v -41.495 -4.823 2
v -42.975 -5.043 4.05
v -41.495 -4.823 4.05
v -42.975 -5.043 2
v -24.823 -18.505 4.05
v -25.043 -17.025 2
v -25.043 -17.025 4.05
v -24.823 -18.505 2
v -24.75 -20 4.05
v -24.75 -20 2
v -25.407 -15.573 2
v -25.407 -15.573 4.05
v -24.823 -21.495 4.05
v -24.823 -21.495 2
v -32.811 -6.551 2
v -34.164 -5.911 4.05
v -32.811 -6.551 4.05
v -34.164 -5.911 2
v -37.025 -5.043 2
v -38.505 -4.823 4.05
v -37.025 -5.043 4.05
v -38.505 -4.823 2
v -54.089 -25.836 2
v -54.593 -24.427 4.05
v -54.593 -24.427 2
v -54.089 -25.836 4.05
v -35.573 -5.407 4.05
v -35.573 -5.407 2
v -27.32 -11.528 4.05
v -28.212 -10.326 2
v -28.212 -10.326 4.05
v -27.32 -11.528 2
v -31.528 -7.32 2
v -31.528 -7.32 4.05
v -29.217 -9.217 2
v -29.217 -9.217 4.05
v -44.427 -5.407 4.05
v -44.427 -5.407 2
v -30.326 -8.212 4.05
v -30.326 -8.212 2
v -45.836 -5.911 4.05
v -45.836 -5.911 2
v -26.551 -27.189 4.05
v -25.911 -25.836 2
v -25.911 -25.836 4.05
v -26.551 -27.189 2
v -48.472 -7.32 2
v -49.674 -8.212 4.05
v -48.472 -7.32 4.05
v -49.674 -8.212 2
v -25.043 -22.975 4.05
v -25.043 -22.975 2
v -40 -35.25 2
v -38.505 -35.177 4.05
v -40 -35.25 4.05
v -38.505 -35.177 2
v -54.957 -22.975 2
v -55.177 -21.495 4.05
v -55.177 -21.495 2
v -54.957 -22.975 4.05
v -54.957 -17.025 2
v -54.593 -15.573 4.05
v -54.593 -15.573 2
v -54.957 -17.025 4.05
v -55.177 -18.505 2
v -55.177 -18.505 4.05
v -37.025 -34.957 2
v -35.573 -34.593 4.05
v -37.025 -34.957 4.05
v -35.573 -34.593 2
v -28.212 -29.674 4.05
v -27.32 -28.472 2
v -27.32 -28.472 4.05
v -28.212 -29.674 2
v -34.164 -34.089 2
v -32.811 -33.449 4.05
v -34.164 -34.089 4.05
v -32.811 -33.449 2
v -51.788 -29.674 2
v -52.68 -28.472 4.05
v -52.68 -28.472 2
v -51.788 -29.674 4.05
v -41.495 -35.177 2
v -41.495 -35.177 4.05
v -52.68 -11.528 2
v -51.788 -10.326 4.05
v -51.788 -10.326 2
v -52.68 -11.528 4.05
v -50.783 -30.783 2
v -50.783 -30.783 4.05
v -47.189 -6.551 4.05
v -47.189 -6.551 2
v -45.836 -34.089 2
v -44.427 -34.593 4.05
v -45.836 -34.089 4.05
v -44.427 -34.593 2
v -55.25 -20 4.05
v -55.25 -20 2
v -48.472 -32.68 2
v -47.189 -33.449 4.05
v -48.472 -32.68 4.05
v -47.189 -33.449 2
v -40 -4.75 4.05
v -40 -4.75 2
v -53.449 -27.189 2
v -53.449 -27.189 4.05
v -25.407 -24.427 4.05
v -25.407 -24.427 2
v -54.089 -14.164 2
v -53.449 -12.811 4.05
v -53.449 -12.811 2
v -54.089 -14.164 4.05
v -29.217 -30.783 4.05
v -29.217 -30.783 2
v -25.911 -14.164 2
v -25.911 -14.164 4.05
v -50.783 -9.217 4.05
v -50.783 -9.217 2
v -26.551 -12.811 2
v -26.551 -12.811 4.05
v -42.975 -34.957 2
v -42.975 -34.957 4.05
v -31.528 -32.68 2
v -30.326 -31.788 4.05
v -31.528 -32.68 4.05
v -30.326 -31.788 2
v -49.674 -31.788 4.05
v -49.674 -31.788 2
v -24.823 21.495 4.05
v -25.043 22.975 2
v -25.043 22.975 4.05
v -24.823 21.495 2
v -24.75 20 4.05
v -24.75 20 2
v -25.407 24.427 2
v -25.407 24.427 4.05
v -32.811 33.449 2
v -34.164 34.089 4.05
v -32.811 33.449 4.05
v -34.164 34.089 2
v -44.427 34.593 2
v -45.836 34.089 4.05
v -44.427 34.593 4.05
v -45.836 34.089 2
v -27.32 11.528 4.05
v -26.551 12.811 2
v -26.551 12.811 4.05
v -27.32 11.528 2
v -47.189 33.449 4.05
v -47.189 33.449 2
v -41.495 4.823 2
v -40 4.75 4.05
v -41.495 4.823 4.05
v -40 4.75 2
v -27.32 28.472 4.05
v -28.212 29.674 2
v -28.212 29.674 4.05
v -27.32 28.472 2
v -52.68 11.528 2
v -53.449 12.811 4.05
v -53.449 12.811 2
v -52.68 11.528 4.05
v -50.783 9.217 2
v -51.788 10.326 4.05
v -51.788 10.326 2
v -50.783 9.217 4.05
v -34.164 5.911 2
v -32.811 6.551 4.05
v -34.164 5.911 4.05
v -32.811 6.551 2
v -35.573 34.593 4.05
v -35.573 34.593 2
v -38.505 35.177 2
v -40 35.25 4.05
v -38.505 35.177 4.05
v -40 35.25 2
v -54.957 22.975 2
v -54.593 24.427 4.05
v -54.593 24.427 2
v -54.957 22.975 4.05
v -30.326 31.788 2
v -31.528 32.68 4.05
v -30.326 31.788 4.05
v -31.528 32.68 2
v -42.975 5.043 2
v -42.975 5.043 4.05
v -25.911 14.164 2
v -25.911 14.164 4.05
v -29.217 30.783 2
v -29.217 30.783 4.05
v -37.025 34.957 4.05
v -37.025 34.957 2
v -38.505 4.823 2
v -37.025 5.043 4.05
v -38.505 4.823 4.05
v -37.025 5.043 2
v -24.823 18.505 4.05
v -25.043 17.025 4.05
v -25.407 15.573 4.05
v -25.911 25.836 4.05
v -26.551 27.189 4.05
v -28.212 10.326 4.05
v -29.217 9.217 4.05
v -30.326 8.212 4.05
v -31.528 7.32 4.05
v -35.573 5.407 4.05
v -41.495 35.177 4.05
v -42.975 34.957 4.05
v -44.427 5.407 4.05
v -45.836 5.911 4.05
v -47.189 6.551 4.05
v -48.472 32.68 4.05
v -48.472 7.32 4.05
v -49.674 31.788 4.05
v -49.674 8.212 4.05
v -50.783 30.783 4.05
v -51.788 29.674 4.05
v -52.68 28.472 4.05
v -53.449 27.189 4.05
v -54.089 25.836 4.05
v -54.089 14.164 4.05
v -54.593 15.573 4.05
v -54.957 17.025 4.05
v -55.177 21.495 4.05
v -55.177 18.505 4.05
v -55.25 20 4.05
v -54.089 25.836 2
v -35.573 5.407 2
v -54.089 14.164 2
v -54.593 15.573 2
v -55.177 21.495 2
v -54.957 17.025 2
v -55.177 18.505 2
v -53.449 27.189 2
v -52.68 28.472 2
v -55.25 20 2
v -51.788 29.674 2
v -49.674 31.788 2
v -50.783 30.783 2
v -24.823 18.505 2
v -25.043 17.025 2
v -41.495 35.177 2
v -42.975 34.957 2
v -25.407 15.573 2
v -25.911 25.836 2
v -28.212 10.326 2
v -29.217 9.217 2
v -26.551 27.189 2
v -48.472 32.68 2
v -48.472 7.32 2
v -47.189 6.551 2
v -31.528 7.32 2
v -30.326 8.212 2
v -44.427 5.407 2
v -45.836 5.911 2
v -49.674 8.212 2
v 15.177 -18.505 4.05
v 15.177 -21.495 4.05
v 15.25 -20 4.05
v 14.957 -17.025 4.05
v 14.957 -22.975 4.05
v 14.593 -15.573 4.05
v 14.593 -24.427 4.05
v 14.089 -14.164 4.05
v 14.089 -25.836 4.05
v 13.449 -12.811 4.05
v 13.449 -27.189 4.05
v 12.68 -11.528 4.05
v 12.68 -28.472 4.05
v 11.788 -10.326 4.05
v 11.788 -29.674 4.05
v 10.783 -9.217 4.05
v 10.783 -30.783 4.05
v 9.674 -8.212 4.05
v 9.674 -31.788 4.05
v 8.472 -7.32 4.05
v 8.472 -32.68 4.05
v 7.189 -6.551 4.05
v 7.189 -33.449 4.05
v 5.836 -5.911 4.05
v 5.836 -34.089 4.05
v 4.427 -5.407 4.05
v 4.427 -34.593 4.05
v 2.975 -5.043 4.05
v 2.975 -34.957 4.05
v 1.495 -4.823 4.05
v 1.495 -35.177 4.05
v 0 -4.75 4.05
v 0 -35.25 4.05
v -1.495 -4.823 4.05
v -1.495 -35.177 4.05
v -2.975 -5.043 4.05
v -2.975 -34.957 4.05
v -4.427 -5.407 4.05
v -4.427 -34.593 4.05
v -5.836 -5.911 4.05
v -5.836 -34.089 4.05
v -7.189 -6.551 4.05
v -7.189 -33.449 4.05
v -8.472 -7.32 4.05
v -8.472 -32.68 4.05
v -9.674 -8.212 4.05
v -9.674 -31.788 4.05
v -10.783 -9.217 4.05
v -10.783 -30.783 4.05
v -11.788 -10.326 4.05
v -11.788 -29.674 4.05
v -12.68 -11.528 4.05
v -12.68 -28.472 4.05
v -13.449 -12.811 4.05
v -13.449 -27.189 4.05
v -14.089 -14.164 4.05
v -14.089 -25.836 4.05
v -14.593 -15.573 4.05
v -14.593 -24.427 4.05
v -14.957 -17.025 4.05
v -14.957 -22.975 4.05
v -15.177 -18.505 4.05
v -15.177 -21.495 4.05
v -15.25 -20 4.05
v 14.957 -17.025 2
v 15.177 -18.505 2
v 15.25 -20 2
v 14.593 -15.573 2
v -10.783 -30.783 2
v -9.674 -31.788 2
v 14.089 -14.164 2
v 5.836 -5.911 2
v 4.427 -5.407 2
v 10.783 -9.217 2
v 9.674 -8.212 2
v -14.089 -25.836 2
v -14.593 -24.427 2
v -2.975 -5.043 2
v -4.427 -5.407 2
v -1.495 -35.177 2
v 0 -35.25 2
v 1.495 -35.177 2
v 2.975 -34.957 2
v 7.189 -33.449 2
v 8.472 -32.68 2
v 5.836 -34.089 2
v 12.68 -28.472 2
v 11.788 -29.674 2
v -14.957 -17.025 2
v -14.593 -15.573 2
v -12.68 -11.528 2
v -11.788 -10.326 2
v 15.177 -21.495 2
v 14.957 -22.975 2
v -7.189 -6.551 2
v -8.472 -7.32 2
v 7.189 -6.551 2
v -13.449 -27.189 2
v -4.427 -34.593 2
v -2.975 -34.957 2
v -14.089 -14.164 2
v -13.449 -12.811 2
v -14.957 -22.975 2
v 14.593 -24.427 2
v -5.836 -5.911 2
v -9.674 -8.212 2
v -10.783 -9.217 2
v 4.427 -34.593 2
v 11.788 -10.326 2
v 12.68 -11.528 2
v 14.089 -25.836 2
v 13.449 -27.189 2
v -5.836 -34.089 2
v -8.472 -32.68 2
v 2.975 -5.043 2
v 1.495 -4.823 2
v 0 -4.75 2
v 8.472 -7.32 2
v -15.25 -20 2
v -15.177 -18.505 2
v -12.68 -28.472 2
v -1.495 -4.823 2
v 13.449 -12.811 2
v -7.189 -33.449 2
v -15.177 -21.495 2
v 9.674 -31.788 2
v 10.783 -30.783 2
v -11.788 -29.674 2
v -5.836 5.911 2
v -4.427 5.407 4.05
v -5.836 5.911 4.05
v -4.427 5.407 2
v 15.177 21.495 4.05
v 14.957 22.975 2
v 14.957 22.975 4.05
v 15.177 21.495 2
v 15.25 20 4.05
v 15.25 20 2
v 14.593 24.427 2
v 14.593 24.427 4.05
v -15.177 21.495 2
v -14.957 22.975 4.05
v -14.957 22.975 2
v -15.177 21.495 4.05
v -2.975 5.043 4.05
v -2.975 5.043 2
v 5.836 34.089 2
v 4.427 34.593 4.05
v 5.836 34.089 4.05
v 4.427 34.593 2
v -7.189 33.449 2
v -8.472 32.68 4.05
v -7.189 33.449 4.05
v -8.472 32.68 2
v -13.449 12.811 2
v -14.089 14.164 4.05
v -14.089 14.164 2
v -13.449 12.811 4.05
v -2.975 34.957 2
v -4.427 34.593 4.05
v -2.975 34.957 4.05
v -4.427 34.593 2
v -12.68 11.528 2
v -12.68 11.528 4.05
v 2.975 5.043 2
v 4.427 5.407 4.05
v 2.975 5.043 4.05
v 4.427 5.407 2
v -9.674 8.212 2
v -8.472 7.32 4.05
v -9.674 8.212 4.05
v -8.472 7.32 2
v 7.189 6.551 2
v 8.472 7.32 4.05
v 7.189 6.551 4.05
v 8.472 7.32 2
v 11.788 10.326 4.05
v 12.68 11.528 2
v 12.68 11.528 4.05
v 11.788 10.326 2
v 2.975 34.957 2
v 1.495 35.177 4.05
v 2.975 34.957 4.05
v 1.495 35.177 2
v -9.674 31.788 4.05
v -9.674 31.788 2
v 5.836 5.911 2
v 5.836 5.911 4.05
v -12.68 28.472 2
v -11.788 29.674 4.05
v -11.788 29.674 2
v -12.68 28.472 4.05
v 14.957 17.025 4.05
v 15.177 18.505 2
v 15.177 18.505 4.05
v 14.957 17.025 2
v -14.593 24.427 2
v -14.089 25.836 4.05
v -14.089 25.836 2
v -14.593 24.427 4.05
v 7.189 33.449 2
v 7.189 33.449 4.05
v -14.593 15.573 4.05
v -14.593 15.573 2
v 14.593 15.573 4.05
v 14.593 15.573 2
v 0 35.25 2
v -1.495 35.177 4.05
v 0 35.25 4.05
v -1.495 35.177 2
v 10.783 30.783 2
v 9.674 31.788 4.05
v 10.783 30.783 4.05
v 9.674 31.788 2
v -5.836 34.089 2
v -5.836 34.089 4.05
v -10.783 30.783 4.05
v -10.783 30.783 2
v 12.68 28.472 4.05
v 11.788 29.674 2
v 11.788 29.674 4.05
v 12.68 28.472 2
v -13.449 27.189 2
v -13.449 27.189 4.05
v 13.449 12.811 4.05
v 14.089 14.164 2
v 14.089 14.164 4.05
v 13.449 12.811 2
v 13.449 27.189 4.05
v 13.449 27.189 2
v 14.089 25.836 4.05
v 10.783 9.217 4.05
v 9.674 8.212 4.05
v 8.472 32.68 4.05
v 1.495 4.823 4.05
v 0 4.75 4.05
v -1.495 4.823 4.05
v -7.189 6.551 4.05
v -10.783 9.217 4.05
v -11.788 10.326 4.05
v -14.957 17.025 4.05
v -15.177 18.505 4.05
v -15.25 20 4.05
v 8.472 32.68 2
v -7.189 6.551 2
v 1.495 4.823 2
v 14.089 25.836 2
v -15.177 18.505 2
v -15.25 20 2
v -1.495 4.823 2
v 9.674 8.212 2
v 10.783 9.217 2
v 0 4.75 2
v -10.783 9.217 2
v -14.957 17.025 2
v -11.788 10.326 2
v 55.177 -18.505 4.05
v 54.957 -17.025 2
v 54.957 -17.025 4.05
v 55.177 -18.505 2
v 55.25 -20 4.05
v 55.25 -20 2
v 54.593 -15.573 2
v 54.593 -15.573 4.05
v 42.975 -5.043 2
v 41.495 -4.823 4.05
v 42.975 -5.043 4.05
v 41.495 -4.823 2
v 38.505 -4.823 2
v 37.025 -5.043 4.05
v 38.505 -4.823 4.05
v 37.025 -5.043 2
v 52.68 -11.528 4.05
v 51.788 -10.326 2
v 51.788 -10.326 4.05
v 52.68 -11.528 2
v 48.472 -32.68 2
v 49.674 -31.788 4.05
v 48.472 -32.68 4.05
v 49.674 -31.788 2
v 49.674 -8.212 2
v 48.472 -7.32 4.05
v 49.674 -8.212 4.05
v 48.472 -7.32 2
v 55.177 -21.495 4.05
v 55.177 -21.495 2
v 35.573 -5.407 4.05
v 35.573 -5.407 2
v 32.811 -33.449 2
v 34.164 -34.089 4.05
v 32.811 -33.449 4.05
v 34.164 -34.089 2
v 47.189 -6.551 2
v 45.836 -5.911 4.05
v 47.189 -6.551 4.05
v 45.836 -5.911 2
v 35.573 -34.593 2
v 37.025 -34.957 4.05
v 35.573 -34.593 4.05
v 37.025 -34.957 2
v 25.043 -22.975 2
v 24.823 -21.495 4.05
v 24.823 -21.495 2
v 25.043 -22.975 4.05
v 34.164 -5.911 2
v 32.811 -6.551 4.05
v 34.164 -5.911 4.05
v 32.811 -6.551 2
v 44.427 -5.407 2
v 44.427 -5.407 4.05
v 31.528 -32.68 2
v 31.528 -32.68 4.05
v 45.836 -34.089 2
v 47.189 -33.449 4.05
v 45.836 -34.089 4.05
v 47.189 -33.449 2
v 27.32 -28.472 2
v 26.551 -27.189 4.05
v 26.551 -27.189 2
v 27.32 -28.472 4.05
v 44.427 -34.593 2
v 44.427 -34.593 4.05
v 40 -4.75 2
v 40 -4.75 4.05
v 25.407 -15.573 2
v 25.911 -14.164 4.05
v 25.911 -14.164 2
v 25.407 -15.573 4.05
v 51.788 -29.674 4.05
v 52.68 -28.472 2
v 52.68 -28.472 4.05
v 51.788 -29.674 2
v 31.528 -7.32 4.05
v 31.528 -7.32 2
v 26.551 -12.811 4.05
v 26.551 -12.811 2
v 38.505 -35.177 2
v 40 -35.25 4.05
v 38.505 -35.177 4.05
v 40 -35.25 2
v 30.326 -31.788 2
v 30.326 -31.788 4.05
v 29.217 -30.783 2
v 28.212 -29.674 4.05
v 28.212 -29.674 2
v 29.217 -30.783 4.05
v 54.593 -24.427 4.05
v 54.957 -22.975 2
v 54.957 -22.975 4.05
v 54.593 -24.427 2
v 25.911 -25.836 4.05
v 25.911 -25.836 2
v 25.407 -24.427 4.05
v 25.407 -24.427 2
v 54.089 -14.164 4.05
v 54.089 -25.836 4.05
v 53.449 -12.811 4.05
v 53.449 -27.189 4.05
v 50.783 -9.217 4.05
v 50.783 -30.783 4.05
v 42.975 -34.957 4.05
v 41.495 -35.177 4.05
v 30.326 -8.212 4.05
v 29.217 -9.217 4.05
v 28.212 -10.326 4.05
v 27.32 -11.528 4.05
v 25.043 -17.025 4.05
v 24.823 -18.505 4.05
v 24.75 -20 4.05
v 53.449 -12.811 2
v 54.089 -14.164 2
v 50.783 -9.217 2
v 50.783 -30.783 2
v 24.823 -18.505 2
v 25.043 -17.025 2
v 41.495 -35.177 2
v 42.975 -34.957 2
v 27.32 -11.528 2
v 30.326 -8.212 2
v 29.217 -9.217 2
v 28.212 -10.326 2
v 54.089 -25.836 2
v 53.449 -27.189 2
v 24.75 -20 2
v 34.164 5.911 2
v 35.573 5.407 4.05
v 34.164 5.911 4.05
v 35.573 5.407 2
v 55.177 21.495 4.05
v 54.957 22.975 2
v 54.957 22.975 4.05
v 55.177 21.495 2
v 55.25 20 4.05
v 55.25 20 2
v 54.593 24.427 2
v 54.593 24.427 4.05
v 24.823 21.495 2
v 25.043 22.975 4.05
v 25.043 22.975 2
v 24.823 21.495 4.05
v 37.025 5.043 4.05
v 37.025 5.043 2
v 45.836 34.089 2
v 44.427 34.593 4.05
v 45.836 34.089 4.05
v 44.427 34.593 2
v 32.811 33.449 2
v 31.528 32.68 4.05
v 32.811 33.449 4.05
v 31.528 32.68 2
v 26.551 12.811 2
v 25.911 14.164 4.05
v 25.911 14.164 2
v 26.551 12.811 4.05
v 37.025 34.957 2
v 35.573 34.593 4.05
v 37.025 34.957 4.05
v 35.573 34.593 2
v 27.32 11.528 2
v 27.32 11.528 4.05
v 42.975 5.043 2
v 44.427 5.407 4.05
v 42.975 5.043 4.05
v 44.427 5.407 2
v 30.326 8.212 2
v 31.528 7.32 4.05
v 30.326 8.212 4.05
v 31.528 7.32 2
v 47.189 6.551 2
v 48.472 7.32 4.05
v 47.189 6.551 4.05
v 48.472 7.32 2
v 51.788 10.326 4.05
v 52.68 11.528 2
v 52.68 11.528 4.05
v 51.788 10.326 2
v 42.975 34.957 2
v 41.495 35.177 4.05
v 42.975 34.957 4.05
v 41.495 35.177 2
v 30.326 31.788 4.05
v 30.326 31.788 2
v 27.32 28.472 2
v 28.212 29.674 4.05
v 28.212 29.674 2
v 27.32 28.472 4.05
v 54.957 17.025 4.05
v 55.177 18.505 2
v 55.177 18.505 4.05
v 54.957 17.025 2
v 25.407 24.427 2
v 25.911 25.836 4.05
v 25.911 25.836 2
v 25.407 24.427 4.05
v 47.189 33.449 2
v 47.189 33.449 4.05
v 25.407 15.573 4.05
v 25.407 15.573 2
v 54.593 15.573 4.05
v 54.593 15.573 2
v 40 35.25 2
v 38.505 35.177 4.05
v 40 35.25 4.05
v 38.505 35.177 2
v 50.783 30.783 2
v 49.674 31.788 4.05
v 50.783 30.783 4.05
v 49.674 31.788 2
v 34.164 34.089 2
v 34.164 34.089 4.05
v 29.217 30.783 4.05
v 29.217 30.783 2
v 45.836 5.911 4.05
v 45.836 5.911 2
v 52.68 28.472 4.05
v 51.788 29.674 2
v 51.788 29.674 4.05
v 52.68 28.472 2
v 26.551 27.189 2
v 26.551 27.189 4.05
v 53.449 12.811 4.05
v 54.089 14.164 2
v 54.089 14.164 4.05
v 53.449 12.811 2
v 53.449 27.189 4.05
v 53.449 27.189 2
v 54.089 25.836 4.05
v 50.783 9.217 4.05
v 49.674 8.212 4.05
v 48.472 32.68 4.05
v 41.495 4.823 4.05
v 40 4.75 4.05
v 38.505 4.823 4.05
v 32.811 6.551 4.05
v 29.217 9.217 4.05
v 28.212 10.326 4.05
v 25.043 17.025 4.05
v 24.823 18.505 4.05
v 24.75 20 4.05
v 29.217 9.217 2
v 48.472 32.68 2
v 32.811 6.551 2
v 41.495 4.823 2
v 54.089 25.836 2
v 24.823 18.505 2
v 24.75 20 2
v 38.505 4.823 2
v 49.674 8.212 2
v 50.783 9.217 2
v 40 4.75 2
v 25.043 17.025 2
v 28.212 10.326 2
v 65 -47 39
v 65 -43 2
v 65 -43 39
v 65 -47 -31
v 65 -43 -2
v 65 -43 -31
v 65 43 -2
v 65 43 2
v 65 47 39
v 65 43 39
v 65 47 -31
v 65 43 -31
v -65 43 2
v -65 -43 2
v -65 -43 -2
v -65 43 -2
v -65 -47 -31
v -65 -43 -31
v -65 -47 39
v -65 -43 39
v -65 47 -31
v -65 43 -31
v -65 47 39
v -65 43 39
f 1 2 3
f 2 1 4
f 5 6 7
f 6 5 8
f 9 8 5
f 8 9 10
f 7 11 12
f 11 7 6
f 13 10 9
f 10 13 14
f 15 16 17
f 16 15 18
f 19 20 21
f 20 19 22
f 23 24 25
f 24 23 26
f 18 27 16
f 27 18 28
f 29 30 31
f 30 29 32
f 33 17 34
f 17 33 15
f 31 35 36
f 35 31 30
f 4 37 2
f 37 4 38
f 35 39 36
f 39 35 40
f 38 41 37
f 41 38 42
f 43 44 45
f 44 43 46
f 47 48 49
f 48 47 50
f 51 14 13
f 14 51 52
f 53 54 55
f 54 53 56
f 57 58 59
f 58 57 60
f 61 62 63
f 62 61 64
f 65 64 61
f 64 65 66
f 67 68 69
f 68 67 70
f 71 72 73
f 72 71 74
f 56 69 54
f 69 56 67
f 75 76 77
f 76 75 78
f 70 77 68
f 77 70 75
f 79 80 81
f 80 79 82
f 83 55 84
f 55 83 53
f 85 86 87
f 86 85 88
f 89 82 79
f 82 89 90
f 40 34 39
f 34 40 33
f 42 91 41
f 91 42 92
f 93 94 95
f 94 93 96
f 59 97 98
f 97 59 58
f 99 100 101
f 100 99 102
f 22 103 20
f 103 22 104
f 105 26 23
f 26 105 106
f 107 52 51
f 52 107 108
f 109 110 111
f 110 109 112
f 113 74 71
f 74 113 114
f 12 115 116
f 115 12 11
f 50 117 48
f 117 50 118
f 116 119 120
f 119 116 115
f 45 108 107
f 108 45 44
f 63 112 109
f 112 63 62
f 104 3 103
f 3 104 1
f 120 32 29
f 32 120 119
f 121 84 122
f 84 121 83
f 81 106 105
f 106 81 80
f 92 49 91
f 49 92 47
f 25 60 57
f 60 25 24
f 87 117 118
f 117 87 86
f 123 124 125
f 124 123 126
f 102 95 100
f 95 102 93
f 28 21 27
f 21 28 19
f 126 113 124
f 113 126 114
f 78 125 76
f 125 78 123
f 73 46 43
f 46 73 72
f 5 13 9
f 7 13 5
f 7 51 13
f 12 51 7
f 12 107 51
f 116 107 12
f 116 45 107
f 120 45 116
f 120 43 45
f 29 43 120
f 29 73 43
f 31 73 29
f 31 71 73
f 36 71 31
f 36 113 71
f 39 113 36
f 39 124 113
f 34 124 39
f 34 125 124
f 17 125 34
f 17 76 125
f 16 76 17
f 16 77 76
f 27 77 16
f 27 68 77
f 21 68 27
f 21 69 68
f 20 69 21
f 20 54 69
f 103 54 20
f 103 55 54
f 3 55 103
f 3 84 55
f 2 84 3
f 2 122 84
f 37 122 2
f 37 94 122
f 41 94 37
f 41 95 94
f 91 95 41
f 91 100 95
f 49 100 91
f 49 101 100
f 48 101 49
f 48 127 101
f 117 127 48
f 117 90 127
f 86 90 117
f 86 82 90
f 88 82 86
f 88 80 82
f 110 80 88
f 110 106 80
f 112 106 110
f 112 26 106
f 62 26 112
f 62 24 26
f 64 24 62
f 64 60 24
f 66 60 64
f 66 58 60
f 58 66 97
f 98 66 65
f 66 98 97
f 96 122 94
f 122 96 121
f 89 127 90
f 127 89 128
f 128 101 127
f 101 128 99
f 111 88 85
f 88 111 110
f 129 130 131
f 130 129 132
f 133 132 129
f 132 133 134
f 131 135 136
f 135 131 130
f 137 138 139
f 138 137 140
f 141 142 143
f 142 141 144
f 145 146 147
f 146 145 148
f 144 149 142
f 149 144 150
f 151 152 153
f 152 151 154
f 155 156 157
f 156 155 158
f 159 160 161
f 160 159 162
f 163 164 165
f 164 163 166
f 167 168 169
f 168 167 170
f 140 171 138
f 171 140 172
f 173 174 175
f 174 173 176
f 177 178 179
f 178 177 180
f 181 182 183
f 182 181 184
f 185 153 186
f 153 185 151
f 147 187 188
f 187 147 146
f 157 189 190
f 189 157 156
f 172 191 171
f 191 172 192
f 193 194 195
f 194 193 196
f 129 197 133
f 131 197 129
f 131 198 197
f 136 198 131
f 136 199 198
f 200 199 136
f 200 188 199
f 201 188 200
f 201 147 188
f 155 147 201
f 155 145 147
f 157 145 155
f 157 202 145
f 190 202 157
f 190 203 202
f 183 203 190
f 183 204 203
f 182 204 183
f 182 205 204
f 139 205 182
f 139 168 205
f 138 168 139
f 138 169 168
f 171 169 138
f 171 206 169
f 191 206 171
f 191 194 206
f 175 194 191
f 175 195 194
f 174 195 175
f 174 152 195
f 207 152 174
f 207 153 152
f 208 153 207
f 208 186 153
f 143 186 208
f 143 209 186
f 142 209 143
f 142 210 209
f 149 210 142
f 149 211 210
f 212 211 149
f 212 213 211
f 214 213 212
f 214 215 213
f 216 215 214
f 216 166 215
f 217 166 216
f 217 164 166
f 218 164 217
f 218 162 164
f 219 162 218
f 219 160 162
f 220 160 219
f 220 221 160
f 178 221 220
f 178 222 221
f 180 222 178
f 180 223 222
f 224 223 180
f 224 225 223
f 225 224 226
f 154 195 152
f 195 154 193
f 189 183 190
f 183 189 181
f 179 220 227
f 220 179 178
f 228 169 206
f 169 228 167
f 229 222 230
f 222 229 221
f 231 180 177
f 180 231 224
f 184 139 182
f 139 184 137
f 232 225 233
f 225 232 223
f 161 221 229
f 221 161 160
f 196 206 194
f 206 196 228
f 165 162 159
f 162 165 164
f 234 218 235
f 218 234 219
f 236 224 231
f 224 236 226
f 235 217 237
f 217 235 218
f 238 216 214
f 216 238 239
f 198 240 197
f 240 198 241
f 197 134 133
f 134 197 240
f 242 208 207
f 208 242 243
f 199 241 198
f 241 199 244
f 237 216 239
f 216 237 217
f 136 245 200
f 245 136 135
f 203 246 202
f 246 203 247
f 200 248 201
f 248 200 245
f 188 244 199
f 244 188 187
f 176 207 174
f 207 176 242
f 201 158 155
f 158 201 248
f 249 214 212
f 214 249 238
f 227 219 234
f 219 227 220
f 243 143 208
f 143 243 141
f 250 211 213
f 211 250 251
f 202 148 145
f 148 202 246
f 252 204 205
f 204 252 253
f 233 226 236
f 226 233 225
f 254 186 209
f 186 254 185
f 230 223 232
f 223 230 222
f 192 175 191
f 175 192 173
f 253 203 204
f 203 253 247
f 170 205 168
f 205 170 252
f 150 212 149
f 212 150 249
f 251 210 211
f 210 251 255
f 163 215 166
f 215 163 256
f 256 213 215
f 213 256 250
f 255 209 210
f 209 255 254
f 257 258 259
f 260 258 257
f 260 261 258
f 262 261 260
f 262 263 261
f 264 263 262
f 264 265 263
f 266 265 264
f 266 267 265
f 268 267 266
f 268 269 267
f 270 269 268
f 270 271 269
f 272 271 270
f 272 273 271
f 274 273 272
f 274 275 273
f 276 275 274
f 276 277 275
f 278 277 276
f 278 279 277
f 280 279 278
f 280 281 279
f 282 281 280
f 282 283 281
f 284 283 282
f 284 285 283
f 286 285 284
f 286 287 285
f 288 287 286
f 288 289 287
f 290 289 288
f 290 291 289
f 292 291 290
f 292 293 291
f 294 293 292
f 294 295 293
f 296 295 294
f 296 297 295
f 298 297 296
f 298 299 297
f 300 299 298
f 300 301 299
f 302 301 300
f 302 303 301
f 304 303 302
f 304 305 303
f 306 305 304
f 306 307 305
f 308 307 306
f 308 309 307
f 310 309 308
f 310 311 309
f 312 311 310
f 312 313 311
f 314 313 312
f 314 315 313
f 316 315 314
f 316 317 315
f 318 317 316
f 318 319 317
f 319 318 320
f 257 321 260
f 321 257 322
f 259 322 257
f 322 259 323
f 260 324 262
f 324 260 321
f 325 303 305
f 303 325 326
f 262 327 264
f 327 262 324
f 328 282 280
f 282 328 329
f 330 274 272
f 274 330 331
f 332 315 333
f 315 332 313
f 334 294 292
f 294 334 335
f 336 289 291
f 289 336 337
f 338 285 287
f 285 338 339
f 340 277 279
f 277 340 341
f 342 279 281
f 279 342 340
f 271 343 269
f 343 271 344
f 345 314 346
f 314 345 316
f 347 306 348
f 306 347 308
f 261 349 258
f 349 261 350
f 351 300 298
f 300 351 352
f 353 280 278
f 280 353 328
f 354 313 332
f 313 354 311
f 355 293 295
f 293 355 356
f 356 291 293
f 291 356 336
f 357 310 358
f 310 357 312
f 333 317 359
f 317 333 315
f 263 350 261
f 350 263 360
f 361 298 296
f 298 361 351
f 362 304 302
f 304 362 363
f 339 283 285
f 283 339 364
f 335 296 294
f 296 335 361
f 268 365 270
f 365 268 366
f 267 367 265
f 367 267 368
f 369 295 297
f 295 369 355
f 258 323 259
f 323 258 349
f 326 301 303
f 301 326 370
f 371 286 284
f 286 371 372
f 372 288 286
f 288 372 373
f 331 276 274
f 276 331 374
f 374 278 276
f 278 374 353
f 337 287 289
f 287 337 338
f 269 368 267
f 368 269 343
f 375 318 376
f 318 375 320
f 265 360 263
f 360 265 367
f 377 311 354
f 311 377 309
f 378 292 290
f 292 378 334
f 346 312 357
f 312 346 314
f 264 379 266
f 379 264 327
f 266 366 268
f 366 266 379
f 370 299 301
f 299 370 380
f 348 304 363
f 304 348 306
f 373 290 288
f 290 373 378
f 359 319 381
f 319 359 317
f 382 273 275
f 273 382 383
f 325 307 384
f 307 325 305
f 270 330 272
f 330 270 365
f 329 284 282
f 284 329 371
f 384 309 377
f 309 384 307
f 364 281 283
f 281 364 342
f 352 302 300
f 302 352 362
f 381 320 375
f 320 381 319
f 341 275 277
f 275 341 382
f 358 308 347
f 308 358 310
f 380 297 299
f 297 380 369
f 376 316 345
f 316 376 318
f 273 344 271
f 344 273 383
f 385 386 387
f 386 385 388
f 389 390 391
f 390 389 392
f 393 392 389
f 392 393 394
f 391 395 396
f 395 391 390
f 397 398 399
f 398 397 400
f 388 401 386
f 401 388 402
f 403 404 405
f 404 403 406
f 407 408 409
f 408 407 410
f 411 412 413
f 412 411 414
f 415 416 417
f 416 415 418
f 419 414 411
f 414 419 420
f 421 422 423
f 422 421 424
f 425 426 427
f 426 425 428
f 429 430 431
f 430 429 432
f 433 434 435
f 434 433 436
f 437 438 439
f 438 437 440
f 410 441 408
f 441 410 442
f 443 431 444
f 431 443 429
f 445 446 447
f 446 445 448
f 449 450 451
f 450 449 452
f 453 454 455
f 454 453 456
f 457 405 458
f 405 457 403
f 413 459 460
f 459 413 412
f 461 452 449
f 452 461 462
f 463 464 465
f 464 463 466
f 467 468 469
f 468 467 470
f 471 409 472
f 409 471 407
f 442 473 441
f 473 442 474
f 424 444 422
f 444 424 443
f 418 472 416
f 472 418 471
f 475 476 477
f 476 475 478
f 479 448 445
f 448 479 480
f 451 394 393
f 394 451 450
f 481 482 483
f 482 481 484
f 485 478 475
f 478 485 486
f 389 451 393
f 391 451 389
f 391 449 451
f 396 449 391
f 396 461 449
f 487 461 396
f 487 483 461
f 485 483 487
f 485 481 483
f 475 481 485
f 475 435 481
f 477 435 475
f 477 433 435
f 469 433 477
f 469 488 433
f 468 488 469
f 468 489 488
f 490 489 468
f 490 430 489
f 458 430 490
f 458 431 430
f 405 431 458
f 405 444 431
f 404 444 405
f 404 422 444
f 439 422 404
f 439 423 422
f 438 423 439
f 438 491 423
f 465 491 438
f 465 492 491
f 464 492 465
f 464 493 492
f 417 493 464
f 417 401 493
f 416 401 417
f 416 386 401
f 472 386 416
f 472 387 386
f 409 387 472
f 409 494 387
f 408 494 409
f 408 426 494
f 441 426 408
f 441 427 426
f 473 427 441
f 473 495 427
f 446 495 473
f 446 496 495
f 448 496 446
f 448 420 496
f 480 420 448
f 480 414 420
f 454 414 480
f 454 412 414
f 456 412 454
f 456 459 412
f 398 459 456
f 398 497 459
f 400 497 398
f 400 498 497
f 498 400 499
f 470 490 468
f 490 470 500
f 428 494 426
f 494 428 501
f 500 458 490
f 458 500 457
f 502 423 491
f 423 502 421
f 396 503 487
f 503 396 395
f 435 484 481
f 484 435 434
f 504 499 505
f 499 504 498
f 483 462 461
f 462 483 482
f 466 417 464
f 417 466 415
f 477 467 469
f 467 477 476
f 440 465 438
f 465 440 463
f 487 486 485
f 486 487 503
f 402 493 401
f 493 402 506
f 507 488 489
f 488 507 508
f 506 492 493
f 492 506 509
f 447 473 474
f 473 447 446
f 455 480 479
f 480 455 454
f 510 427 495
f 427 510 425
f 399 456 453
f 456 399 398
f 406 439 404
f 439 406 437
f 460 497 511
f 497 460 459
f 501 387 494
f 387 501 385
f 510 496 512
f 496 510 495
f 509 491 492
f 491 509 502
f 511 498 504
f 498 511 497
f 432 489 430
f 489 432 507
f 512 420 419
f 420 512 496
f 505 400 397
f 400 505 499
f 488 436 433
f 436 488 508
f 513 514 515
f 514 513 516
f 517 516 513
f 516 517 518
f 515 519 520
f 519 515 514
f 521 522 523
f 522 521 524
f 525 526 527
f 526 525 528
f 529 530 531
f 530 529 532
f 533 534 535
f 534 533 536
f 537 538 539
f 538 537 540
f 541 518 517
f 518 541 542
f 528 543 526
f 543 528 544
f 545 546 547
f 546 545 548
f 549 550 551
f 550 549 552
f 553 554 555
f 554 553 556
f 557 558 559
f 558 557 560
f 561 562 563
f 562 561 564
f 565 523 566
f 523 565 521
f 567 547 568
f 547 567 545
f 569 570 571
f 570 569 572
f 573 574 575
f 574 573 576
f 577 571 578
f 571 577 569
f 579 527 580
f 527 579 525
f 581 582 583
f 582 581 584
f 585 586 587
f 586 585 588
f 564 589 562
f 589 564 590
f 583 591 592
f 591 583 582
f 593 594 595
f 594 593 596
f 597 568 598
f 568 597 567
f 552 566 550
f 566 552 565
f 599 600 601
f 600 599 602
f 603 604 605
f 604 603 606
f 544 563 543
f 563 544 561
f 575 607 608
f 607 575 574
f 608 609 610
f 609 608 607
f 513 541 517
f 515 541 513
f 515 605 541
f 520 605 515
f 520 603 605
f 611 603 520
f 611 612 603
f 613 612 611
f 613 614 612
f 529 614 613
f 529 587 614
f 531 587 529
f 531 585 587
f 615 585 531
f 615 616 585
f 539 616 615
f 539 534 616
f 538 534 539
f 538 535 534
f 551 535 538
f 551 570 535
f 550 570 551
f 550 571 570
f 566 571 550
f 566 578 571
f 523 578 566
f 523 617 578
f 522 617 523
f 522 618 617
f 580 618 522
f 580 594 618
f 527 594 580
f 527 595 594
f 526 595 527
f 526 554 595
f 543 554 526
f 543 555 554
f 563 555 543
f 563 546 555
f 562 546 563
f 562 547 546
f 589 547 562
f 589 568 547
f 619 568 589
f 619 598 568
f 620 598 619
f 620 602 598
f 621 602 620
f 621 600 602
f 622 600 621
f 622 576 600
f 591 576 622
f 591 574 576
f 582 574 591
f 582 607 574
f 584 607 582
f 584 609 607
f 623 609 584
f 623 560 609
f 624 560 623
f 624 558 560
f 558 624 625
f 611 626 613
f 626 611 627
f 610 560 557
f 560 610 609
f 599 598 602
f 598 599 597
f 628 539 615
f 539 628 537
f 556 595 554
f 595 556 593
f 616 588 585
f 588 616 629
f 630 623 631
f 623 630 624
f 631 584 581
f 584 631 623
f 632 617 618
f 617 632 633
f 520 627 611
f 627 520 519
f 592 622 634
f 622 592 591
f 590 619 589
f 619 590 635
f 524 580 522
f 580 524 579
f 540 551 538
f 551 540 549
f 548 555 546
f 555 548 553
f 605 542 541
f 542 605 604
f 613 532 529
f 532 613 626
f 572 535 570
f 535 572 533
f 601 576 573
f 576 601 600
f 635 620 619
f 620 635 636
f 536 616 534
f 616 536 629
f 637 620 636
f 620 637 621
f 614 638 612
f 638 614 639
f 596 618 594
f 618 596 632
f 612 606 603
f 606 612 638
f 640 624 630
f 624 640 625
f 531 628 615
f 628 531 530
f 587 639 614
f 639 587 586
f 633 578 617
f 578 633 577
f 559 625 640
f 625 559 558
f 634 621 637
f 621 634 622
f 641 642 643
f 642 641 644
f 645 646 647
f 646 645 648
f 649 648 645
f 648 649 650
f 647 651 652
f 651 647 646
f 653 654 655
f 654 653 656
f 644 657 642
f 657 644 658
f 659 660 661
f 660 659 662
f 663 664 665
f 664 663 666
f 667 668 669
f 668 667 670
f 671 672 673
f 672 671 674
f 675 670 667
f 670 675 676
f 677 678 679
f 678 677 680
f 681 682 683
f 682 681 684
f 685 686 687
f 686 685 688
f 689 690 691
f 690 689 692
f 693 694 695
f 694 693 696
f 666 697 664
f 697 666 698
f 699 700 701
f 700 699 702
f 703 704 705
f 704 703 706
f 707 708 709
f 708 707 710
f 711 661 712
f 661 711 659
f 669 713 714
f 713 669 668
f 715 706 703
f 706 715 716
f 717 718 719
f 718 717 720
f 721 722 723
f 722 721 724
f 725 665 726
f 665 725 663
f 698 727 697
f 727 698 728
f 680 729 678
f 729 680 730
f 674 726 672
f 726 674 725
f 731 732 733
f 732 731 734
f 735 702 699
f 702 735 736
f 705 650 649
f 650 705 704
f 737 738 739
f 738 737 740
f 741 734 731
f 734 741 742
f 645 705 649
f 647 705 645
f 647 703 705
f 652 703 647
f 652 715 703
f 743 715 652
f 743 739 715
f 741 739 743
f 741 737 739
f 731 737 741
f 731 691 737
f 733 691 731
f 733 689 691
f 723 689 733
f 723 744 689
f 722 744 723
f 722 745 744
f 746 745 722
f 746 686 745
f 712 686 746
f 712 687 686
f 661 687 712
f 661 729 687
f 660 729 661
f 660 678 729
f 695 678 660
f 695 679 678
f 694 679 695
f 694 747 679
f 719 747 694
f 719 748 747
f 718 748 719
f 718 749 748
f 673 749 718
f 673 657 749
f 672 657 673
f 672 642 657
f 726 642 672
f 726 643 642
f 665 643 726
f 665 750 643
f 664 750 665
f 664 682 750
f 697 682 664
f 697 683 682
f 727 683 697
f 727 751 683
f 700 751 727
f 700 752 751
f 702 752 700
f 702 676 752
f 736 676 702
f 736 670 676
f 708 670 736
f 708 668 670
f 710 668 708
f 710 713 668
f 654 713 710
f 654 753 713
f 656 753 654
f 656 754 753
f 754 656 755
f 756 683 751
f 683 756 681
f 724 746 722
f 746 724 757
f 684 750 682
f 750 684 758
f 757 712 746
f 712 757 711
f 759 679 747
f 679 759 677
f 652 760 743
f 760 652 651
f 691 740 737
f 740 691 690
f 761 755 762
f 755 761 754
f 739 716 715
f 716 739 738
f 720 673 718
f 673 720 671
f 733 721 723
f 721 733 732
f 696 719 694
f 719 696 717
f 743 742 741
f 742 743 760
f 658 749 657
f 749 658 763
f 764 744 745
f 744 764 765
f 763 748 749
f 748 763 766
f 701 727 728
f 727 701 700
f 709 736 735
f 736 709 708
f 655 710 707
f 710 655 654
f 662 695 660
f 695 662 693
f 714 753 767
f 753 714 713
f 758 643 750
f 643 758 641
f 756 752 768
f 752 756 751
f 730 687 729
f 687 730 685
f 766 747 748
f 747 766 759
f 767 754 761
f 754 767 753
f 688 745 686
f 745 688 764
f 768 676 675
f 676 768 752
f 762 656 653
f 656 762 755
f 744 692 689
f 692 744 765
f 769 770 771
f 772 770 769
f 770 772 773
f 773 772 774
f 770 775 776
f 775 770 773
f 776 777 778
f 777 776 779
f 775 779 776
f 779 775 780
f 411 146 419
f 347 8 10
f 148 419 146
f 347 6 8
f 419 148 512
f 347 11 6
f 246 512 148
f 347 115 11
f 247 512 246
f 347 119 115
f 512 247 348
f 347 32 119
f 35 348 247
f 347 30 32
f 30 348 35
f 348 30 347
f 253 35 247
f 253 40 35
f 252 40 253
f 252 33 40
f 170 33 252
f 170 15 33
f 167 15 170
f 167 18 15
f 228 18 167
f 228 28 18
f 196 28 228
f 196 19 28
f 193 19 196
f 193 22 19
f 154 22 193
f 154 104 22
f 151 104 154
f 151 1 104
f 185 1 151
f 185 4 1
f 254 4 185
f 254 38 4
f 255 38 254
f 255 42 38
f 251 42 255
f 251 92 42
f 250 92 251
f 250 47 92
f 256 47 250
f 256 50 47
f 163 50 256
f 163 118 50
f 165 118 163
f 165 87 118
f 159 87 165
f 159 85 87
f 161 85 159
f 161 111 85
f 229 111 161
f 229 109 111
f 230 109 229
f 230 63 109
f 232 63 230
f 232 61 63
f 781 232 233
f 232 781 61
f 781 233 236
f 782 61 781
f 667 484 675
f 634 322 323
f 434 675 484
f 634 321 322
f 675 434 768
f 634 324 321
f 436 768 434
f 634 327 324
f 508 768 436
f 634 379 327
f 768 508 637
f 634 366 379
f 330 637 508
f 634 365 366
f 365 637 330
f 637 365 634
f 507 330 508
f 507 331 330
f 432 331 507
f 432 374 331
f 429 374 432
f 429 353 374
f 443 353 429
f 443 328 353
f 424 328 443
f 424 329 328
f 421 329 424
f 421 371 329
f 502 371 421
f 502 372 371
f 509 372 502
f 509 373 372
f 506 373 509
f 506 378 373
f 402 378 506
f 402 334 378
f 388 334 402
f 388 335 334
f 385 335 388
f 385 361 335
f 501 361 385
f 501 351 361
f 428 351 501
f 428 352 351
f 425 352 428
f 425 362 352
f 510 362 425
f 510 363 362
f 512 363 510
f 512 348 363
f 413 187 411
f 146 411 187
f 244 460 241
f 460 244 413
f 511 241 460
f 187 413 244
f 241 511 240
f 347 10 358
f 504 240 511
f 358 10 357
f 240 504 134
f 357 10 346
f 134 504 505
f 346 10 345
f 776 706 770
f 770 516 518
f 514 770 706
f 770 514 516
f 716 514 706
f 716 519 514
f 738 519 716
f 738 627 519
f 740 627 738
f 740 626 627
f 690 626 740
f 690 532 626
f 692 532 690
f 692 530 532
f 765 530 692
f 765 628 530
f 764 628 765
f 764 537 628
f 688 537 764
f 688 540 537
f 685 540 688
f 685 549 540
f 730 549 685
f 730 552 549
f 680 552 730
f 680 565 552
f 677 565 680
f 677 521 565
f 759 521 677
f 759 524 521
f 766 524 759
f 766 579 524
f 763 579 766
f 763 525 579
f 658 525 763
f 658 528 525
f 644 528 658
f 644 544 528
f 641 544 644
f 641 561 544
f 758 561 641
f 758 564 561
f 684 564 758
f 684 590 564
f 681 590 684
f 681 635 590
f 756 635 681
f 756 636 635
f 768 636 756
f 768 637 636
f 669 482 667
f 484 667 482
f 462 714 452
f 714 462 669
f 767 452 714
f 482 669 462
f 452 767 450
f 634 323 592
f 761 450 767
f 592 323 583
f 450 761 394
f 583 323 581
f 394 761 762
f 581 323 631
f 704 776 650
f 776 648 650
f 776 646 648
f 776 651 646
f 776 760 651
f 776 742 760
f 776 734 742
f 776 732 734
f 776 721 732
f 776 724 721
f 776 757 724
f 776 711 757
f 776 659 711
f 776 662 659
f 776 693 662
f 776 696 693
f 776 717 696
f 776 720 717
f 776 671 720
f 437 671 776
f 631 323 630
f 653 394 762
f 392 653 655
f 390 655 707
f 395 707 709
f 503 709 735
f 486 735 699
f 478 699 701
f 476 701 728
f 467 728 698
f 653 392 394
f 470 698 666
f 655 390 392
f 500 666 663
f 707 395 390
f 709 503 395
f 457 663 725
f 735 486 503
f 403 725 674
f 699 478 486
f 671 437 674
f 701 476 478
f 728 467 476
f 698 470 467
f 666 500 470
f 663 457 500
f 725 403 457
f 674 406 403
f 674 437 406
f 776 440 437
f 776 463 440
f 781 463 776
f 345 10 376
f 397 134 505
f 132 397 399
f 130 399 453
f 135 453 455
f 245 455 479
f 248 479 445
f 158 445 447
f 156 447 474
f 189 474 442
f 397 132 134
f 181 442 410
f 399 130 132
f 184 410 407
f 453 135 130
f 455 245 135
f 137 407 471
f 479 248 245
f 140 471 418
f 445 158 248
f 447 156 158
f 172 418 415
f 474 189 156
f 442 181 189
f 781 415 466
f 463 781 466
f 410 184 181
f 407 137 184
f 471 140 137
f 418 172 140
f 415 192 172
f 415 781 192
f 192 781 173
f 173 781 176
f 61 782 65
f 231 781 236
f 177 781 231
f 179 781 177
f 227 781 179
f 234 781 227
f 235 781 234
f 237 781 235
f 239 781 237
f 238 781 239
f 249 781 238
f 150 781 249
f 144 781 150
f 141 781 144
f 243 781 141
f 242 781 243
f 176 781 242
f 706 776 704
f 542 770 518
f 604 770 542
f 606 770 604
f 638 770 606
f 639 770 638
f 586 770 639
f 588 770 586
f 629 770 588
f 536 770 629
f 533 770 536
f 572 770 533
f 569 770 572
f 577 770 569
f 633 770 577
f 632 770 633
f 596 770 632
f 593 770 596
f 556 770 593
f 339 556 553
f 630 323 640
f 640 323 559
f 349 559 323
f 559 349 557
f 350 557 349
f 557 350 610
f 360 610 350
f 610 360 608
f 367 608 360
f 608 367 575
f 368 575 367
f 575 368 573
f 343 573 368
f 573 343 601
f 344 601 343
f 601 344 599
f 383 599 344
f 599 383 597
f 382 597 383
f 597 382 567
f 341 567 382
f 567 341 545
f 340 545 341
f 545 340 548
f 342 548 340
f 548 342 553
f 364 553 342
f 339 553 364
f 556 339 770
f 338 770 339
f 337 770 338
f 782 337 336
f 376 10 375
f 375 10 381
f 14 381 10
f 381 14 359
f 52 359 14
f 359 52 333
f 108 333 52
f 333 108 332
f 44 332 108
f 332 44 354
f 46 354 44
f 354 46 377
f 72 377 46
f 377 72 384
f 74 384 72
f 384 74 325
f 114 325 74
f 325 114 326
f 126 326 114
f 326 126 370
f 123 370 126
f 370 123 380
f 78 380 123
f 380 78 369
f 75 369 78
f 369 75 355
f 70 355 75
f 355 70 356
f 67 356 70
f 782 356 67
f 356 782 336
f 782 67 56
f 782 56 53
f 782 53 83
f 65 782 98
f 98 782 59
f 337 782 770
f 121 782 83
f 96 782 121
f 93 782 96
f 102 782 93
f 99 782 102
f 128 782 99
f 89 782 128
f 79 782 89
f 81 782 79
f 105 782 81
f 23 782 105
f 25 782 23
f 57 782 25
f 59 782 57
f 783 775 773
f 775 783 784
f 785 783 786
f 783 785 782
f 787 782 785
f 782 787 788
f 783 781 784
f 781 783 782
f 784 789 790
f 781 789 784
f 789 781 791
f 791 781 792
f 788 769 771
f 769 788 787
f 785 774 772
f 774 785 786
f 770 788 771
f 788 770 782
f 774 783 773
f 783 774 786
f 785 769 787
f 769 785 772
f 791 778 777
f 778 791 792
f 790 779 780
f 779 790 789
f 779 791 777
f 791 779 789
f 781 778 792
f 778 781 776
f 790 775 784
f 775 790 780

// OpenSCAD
// Dimensions for 6x 50 mL Falcon Tubes Rack
// Units: mm

// Plate Dimensions
plate_x = 130;
plate_y = 90;
plate_z = 4;

// Tube Hole Dimensions
hole_diameter = 30.5;
hole_z_height = 70; // Height of the rack walls

// Grid Dimensions
grid_cols = 3;
grid_rows = 2;
grid_spacing_x = 40;
grid_spacing_y = 40;

// Wall Dimensions
wall_thickness = 4;
wall_height = hole_z_height;

$fn = 64;

// Main Rack Assembly
module rack() {
    union() {
        // 1. Base Plate
        translate([0, 0, 0])
            cube([plate_x, plate_y, plate_z], center = true);

        // 2. Tube Holes (Through holes)
        // Center the grid on the plate
        grid_offset_x = (grid_cols - 1) * grid_spacing_x / 2;
        grid_offset_y = (grid_rows - 1) * grid_spacing_y / 2;

        for (i = [0 : grid_cols - 1]) {
            for (j = [0 : grid_rows - 1]) {
                translate([
                    i * grid_spacing_x - grid_offset_x,
                    j * grid_spacing_y - grid_offset_y,
                    plate_z / 2
                ]) {
                    cylinder(
                        h = plate_z + 0.1, // Slightly extend to ensure clean through-hole
                        d = hole_diameter,
                        center = true
                    );
                }
            }
        }

        // 3. Side Walls
        // Left Wall (at Y = -plate_y/2)
        translate([0, -plate_y / 2, plate_z])
            cube([plate_x, wall_thickness, wall_height], center = true);

        // Right Wall (at Y = +plate_y/2)
        translate([0, plate_y / 2, plate_z])
            cube([plate_x, wall_thickness, wall_height], center = true);
    }
}

// Render
rack();
